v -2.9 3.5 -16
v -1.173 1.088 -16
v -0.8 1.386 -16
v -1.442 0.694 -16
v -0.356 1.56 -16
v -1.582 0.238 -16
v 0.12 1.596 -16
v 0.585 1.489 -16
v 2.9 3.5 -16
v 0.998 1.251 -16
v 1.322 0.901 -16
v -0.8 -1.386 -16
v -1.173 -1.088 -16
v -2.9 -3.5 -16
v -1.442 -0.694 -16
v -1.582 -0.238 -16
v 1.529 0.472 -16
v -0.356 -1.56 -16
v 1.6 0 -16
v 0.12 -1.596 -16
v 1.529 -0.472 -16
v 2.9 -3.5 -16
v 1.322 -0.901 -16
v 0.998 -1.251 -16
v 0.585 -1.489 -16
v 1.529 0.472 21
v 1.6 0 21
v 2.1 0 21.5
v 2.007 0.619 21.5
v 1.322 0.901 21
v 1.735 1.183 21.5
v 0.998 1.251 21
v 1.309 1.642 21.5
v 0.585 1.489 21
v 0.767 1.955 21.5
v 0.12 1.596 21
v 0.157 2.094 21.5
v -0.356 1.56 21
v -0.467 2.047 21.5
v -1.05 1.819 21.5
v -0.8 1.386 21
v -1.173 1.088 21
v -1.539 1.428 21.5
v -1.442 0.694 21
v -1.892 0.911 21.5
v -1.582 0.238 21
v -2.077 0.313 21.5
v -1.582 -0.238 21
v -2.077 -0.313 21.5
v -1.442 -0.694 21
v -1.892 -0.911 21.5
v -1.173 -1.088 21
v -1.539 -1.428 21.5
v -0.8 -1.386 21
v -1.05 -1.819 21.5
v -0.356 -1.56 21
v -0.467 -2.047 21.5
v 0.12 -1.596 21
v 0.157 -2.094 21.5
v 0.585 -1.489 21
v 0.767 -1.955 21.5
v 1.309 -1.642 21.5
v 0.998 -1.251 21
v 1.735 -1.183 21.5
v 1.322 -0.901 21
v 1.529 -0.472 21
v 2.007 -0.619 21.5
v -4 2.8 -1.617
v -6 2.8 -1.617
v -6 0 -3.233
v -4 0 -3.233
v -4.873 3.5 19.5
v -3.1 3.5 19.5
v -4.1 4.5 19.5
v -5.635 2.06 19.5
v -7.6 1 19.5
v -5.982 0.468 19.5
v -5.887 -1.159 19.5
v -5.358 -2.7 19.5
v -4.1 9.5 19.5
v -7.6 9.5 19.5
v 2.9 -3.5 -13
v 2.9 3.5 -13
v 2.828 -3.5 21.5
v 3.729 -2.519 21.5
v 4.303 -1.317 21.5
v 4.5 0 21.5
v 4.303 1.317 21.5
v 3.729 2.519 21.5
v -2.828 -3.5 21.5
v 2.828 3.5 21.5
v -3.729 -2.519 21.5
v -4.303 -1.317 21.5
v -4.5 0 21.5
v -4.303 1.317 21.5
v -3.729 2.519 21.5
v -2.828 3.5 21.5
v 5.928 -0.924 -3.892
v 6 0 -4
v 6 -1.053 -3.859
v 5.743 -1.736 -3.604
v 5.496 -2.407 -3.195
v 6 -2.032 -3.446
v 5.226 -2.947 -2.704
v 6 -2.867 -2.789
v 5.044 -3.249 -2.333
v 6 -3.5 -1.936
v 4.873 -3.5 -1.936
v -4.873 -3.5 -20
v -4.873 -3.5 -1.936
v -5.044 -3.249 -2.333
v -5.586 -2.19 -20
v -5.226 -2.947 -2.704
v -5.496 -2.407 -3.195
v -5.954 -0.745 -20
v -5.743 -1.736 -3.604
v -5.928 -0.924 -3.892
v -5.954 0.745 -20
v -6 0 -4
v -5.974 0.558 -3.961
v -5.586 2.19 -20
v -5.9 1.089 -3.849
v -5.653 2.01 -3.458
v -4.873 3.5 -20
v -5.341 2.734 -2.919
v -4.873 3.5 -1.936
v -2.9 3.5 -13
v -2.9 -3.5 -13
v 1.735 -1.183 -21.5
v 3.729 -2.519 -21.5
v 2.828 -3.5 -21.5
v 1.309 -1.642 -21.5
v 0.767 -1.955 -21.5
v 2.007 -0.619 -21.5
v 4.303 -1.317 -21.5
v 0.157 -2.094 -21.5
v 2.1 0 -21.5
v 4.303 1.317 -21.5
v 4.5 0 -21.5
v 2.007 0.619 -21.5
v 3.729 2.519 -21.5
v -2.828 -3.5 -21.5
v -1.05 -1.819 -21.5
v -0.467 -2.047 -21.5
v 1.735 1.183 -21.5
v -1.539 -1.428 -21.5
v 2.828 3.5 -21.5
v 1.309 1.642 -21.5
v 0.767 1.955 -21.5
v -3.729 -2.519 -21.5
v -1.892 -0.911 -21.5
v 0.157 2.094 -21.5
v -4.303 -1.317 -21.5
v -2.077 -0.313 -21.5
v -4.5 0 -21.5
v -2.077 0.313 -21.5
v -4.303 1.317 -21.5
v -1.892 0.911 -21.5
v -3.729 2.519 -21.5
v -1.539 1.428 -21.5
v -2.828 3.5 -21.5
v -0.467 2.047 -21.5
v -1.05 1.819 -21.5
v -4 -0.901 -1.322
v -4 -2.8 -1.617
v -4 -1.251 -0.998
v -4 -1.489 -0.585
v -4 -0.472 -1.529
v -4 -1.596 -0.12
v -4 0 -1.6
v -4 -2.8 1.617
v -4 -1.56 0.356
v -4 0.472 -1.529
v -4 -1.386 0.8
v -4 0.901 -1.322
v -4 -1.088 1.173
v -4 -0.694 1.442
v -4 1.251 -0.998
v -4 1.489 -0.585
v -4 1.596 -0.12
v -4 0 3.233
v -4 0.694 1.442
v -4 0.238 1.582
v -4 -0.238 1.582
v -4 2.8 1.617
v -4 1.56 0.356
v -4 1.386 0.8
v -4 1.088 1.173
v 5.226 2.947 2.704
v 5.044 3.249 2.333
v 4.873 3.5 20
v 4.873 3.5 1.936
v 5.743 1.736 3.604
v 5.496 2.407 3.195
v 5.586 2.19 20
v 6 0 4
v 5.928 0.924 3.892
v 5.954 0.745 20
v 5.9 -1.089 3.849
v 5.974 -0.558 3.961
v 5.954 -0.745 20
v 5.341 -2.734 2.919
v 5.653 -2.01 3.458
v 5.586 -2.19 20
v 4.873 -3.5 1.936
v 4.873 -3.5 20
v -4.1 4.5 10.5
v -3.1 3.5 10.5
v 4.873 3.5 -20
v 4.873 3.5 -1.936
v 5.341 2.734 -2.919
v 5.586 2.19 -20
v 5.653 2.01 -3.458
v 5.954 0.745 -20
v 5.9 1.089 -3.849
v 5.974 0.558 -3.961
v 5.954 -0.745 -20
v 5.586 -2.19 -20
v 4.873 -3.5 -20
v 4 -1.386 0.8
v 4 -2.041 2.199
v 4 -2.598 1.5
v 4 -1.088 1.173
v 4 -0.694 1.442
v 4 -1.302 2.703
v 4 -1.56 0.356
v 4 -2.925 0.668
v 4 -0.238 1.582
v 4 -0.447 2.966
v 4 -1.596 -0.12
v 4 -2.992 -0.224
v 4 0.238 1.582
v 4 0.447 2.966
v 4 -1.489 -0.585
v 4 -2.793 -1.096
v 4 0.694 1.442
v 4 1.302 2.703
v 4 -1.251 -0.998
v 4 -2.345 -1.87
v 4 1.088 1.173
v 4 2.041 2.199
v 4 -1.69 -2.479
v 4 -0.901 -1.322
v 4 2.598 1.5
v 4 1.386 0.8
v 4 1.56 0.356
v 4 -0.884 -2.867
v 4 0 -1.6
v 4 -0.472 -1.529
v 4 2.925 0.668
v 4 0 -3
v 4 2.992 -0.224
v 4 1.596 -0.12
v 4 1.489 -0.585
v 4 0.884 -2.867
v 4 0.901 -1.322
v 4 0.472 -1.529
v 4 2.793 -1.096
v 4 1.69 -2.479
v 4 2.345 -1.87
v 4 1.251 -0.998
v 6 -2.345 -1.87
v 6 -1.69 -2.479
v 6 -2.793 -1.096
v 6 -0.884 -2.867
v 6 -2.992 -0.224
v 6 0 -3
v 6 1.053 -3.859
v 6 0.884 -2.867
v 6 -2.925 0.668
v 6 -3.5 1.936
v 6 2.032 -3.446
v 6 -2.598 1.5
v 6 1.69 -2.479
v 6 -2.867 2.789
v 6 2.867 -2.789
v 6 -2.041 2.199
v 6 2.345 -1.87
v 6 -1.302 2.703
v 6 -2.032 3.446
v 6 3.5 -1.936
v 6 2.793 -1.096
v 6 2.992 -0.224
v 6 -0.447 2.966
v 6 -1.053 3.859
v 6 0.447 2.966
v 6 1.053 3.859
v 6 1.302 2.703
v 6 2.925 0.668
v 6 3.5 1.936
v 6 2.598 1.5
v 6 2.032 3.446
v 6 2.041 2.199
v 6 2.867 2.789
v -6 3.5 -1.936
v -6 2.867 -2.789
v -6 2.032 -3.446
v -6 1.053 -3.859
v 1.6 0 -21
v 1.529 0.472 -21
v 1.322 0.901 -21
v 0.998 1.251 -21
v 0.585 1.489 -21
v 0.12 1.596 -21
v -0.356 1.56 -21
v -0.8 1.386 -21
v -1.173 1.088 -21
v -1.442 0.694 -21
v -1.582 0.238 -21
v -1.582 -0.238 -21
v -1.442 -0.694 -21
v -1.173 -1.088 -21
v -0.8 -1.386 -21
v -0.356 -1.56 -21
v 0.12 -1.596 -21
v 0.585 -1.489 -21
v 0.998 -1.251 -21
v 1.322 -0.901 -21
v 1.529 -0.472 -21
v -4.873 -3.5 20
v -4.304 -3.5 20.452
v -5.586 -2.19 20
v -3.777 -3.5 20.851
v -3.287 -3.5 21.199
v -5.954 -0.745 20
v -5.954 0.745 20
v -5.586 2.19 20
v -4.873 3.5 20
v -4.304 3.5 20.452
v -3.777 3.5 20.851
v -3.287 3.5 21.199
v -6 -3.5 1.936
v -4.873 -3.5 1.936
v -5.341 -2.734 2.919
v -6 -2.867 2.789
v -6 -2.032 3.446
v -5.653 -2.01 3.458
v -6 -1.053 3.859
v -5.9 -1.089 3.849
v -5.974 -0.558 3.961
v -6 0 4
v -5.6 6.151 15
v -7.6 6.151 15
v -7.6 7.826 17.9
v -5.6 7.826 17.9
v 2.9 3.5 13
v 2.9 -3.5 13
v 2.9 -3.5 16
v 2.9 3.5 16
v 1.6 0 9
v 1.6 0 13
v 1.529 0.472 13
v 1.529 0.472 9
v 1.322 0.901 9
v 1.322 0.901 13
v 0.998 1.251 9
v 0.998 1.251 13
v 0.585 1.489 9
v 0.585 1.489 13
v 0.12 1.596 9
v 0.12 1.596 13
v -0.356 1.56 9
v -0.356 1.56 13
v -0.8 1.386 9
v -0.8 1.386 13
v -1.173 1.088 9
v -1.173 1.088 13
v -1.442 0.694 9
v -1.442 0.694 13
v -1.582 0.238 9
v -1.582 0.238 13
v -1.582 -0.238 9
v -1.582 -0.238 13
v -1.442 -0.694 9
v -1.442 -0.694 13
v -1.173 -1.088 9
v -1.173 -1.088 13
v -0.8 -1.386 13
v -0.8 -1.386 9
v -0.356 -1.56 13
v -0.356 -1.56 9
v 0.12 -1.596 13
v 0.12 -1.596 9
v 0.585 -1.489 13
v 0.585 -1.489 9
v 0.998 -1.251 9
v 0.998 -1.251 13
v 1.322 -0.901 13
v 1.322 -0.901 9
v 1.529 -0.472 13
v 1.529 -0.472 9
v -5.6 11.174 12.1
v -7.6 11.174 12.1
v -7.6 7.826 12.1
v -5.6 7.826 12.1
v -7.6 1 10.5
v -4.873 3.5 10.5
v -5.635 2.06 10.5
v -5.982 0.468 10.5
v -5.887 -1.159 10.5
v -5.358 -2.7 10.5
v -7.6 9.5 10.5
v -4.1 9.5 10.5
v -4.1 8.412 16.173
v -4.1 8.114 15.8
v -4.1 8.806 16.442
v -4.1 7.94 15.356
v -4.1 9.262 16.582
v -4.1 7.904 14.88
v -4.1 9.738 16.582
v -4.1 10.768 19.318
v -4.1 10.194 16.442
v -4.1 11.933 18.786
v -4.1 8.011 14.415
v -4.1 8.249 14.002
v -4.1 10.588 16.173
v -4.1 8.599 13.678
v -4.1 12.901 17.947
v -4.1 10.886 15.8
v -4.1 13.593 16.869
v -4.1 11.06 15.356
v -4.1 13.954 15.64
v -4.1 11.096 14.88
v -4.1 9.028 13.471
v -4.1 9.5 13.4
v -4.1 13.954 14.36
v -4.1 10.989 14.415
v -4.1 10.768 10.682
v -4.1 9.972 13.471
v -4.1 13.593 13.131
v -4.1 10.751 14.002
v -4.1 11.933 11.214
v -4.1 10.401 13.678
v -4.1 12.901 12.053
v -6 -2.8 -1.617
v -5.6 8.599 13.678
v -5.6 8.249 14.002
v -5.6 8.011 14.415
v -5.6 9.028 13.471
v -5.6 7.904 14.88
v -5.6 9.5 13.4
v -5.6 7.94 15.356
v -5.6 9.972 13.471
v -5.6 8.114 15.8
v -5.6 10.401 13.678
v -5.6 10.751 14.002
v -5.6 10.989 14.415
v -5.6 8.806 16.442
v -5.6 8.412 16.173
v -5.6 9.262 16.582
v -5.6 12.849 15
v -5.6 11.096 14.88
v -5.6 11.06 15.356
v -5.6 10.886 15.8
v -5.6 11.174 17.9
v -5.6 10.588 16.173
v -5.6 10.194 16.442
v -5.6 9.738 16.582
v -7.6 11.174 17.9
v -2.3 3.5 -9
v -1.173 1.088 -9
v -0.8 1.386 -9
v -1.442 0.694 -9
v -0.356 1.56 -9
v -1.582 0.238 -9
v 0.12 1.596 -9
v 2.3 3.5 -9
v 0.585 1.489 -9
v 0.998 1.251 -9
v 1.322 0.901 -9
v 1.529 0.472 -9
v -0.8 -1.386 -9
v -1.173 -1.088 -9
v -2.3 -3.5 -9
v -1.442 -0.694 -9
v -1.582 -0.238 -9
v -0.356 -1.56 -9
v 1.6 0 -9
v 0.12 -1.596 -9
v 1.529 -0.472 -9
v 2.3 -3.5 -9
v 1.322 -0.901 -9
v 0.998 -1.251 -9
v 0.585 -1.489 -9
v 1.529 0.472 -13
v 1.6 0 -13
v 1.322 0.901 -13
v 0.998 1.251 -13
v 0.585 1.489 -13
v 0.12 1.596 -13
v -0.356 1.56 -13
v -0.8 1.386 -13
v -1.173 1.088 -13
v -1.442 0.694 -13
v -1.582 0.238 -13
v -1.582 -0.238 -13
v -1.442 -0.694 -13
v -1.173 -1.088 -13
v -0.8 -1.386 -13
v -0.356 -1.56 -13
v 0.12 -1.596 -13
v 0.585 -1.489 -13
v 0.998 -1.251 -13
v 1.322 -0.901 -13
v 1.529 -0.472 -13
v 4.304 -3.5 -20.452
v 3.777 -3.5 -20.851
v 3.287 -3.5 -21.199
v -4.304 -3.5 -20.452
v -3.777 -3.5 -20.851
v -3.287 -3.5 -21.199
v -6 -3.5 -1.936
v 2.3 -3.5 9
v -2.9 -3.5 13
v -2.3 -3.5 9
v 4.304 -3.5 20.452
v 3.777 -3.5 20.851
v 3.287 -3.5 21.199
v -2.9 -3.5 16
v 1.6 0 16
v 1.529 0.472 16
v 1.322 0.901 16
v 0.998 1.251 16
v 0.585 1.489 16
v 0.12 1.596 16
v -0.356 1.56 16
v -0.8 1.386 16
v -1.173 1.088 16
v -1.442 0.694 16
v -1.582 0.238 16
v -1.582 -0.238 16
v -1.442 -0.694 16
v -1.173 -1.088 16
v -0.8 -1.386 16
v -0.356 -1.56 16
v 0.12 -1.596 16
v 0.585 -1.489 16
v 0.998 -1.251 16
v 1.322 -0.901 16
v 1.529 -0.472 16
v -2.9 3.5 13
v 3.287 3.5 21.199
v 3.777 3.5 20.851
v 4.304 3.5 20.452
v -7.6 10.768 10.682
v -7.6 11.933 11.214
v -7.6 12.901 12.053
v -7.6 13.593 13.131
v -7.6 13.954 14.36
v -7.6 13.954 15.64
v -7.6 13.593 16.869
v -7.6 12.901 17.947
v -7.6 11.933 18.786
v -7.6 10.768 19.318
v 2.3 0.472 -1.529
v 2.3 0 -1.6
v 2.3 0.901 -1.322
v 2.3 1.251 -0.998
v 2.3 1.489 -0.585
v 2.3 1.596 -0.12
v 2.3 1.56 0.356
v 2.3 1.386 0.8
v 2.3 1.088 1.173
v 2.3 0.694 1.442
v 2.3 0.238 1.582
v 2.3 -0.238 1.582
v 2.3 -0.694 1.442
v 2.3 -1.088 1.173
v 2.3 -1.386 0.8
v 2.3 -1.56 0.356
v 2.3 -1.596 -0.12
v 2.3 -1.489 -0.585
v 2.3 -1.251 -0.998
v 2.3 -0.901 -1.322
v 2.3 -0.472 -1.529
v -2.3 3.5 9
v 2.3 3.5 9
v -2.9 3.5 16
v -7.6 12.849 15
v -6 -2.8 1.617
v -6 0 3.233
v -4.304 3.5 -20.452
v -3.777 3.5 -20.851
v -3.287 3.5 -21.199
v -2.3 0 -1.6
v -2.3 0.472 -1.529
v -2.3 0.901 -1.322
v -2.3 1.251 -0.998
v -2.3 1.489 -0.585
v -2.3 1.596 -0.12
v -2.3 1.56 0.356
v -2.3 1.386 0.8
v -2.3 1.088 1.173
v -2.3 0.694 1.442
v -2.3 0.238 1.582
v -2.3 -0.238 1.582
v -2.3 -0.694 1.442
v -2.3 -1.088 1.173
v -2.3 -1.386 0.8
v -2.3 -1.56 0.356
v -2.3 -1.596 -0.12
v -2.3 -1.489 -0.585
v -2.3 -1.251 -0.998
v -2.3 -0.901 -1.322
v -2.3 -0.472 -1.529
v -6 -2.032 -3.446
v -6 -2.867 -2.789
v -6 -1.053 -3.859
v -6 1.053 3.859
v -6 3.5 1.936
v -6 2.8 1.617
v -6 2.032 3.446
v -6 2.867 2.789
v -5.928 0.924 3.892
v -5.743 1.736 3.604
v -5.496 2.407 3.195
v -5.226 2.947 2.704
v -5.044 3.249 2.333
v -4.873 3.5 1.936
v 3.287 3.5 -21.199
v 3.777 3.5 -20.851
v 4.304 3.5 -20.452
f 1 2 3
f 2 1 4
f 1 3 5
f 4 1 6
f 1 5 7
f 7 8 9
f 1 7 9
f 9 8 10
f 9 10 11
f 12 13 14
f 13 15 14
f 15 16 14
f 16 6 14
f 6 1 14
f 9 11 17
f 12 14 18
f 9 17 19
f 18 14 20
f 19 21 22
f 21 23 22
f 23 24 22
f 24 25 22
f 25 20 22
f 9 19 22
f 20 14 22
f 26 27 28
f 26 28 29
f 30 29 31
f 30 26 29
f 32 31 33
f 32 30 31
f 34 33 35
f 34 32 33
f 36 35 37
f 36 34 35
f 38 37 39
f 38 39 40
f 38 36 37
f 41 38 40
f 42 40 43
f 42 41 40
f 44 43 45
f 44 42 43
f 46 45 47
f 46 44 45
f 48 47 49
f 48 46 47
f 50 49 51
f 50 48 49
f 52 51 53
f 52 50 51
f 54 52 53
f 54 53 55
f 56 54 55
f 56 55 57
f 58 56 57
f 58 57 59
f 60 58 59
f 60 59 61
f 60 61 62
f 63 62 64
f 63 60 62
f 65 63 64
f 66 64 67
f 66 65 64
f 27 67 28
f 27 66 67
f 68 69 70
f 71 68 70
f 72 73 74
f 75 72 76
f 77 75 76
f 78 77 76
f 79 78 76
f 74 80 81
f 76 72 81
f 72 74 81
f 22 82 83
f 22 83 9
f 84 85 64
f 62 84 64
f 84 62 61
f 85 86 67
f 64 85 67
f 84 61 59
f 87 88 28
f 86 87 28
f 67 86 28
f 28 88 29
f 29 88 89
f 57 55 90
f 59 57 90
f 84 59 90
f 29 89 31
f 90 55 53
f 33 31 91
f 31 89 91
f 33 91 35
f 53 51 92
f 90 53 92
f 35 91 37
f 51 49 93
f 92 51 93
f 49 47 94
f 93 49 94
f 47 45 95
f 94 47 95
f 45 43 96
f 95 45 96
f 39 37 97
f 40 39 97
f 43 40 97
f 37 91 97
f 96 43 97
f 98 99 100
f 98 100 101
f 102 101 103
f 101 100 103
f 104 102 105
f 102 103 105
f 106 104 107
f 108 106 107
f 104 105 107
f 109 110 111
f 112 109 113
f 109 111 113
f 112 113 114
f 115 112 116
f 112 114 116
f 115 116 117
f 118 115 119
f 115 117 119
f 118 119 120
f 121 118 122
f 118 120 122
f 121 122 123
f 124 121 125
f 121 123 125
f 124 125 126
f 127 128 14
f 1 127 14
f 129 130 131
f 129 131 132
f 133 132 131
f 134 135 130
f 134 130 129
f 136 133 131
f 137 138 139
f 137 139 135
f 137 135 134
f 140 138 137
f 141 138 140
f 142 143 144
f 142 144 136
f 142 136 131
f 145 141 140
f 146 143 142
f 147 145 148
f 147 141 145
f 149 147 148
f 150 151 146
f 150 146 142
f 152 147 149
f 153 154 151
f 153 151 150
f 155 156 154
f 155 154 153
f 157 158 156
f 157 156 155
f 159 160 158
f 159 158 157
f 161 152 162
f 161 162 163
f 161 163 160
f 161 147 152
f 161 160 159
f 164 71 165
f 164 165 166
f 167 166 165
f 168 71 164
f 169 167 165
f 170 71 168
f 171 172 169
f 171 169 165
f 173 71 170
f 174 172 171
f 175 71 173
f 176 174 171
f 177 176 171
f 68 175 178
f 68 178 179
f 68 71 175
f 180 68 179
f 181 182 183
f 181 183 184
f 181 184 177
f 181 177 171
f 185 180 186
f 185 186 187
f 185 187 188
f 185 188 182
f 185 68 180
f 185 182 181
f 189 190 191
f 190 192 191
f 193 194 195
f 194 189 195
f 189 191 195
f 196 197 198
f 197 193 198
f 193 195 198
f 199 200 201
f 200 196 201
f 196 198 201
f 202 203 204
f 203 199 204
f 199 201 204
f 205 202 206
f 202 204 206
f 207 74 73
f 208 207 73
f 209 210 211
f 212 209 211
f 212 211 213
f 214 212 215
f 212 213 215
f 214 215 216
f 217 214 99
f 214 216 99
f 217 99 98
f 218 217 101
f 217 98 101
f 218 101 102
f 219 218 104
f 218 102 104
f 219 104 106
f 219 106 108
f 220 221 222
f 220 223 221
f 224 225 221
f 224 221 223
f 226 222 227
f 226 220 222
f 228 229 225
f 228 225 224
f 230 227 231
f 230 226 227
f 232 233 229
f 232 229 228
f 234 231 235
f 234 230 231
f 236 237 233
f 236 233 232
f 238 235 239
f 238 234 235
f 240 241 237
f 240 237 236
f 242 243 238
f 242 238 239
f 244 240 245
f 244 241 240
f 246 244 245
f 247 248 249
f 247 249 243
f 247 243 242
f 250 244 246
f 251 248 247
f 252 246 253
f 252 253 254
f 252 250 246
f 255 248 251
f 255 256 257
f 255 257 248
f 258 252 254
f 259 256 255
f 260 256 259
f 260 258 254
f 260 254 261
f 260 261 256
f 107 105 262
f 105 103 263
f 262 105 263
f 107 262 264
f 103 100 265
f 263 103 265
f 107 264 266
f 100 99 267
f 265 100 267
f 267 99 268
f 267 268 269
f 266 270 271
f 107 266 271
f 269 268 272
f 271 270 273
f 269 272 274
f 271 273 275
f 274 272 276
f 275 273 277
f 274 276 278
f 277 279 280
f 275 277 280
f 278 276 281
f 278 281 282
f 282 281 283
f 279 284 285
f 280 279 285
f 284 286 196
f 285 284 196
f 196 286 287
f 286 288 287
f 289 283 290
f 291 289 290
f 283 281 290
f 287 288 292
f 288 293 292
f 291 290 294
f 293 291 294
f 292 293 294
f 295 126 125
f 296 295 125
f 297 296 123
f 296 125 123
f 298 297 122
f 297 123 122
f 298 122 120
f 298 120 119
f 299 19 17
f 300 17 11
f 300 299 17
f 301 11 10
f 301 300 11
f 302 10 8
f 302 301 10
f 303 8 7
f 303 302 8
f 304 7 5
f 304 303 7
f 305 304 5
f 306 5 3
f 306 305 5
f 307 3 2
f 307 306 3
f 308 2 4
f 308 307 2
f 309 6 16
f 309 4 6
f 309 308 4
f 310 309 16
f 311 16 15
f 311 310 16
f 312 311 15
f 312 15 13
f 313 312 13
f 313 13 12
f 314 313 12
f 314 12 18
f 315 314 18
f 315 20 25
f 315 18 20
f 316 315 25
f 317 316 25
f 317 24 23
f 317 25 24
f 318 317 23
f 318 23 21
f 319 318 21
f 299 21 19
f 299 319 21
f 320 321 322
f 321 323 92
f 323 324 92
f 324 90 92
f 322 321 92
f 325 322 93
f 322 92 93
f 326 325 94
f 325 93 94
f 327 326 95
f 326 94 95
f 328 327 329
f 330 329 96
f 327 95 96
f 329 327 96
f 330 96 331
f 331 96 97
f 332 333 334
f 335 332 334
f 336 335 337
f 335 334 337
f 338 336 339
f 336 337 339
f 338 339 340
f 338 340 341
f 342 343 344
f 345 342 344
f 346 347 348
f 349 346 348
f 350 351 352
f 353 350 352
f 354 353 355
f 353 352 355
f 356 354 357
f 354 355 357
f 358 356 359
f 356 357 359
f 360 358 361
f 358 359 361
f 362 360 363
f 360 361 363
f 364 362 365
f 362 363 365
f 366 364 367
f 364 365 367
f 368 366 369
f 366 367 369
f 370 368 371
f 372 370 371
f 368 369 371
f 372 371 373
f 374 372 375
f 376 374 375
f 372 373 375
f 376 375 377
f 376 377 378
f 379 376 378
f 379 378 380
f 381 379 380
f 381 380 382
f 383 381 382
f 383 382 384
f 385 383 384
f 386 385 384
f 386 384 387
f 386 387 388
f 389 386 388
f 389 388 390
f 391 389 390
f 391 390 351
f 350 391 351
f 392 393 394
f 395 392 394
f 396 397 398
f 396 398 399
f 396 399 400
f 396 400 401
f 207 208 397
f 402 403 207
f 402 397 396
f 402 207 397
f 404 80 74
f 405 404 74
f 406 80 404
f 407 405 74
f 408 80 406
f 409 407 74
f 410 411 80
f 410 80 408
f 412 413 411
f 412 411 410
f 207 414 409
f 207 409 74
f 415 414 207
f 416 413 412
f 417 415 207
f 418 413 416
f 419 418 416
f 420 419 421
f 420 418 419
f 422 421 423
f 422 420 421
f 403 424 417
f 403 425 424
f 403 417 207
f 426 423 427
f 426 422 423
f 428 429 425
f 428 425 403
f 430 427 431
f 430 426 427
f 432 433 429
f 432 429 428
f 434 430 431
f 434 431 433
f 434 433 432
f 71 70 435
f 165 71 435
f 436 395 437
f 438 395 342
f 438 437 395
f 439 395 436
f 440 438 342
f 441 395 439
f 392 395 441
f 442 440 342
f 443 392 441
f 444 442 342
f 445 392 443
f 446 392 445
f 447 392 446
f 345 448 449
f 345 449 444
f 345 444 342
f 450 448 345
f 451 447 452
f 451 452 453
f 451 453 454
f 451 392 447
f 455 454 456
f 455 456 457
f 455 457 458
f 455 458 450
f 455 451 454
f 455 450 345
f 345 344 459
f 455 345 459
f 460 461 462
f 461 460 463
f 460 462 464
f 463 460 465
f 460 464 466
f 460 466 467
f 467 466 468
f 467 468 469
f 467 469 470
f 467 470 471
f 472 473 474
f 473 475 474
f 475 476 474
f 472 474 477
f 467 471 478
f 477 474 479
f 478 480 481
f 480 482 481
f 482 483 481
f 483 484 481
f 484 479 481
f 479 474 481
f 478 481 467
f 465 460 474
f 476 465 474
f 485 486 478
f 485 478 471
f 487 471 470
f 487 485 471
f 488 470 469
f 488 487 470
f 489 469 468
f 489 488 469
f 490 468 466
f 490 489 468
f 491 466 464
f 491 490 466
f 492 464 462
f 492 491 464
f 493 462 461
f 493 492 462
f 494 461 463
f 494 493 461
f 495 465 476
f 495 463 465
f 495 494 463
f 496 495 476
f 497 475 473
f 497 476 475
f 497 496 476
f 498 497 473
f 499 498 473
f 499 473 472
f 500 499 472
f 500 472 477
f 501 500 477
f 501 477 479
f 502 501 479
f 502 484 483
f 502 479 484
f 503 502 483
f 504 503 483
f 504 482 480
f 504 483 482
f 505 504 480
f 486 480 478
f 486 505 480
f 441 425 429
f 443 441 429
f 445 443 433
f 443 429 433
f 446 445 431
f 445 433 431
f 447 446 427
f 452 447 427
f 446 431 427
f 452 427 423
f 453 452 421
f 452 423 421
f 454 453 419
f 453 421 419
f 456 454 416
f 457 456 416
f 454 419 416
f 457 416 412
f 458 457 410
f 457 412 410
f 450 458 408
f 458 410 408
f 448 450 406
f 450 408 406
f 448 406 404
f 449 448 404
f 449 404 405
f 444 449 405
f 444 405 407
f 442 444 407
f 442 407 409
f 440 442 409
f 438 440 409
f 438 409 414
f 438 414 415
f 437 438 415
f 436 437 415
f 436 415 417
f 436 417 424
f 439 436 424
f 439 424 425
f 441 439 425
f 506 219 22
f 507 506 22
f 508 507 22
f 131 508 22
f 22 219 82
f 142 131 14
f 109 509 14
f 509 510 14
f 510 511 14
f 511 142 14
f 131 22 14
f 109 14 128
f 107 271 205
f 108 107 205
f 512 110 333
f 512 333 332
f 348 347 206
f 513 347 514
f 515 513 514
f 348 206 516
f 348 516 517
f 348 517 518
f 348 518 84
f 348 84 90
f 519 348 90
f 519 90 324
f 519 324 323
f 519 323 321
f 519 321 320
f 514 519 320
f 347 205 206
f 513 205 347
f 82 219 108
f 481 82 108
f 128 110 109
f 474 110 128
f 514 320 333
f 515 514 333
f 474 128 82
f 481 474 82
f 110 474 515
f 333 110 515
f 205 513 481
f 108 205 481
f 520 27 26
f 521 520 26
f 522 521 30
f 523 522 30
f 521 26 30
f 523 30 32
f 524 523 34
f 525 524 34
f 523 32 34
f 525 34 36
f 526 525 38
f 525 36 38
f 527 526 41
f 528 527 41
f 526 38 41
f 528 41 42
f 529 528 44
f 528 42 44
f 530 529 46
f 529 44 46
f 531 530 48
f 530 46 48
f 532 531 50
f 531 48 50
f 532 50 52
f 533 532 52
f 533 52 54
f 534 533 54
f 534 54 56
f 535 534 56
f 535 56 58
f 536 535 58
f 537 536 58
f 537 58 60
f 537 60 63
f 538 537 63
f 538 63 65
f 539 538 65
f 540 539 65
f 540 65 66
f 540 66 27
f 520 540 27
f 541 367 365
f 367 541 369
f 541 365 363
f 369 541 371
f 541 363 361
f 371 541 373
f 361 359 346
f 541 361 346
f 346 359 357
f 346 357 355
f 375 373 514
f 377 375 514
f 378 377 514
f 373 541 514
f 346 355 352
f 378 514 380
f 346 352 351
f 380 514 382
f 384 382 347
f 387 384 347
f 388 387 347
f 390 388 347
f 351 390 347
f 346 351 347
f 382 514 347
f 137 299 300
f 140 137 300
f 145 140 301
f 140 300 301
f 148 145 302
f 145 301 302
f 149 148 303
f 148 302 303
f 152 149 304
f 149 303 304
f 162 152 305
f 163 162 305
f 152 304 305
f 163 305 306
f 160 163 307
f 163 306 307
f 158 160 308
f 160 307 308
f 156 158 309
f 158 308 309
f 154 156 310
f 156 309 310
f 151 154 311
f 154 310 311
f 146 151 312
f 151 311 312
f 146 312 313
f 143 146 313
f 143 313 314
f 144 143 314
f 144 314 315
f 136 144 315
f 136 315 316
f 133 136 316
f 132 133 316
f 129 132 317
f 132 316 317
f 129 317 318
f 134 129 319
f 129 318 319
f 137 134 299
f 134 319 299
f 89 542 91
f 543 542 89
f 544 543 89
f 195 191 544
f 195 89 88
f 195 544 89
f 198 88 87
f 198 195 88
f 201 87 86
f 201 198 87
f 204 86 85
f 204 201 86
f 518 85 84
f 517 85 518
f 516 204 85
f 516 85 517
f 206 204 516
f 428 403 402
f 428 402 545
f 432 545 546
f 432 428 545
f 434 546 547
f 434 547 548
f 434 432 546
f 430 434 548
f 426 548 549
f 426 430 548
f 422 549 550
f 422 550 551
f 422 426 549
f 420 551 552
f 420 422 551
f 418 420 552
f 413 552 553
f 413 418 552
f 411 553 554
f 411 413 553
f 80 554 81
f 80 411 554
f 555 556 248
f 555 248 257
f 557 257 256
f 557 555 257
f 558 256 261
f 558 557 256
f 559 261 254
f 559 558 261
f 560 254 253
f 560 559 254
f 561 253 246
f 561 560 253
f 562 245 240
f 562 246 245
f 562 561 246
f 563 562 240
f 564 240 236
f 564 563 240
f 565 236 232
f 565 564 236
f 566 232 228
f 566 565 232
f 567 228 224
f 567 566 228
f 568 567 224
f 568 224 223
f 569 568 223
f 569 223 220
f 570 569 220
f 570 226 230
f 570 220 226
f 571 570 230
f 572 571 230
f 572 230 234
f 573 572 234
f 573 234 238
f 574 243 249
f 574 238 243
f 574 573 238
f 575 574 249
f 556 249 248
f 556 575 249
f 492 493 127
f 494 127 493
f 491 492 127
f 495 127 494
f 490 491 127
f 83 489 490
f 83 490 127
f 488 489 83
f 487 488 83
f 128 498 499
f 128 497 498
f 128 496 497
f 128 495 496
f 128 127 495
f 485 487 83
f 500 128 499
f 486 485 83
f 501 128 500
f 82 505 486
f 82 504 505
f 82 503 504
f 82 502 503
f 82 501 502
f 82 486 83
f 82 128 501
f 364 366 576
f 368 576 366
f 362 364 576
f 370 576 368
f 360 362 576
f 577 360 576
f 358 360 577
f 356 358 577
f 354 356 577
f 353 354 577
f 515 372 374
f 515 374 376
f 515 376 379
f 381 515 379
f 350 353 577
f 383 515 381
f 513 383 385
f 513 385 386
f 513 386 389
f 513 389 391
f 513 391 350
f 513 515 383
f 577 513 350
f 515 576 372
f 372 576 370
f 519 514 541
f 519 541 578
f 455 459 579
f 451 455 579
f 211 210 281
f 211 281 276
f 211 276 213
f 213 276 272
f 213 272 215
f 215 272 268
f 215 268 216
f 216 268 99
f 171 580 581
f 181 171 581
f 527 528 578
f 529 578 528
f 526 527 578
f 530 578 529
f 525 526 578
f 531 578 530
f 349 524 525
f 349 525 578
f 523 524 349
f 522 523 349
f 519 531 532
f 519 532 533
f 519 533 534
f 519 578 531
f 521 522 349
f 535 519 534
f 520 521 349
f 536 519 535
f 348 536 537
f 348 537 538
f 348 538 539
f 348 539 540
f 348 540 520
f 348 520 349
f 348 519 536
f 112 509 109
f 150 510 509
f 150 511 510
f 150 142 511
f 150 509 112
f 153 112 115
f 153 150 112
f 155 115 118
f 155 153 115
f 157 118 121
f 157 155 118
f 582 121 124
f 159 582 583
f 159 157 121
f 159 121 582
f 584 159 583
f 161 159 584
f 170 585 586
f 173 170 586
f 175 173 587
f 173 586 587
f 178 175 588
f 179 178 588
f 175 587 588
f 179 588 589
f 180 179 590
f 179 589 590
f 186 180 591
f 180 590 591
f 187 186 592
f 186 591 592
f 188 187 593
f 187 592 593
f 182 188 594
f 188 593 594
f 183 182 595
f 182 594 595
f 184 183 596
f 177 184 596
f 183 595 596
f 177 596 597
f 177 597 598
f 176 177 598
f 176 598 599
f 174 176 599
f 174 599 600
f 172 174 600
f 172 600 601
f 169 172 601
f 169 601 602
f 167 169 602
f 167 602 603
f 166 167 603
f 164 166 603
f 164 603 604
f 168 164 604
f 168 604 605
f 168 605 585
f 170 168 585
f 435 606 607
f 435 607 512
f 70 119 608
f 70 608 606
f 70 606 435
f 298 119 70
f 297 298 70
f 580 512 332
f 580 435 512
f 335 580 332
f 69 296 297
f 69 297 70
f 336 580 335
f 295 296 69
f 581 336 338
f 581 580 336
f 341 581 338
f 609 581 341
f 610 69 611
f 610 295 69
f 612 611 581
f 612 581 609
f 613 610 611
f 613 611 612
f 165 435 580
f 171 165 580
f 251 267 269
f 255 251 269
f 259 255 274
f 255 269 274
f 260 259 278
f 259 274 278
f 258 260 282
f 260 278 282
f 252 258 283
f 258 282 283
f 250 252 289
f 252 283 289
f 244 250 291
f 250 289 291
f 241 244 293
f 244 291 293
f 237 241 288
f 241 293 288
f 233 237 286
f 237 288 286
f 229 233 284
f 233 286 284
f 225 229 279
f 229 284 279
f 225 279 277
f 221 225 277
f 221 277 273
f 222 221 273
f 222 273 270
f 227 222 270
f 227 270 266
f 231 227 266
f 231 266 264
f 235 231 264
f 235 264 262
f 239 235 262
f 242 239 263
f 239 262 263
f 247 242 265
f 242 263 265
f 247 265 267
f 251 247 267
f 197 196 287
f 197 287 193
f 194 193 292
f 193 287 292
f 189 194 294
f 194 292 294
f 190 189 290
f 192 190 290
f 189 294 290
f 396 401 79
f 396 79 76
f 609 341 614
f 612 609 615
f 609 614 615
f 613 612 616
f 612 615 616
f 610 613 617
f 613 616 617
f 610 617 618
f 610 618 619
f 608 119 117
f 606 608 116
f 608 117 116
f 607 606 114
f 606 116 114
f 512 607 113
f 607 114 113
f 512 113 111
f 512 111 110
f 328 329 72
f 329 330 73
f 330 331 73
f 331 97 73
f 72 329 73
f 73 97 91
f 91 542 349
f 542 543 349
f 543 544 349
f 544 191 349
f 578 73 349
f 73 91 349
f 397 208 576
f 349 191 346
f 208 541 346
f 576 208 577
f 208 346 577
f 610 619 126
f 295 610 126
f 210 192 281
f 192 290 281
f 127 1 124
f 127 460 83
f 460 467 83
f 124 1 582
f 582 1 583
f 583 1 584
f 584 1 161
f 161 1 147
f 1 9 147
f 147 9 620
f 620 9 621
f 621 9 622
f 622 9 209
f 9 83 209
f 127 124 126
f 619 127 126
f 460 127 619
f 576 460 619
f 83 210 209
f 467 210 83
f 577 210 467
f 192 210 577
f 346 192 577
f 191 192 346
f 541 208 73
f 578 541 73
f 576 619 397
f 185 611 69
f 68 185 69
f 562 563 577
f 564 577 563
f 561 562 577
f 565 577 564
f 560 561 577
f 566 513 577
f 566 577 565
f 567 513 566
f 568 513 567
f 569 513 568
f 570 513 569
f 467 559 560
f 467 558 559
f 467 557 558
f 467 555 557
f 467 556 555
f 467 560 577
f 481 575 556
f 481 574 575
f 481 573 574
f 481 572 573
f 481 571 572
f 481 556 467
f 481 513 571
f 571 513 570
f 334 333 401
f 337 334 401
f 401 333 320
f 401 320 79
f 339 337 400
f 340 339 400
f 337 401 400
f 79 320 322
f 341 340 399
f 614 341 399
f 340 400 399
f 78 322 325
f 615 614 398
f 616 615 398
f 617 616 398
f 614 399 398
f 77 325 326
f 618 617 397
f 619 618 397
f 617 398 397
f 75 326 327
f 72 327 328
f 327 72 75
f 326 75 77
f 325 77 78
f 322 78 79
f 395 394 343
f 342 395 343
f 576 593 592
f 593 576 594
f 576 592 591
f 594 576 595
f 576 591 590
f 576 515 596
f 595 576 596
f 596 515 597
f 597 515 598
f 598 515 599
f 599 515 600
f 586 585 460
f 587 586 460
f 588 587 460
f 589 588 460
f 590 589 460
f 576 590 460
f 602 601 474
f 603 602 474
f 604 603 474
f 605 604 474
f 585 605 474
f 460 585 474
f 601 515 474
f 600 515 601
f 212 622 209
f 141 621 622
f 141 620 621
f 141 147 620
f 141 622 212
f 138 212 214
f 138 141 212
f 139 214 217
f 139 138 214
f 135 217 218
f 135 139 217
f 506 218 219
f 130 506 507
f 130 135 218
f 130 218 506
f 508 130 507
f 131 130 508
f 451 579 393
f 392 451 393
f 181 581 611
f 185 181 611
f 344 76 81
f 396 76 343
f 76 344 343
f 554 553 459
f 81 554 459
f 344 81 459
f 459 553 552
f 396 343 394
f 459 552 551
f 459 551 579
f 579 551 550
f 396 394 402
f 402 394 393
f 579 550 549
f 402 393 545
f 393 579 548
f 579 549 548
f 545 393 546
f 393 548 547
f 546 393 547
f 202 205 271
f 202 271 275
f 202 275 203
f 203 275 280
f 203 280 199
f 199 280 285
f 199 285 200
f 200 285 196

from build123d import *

# Parameters (mm, degrees)
BOSS_EXTRUDE1_DEPTH     = 21.5
BOSS_EXTRUDE2_DEPTH     = 6
CHAMFER1_SIZE           = 1.5
SKETCH2_W               = 4.6
SKETCH2_H               = 18
CUT_EXTRUDE1_DEPTH      = 4.5000001
CUT_EXTRUDE1_DEPTH_BACK = 4.5000001
SKETCH3_R               = 1.6
CUT_EXTRUDE2_DEPTH      = 16
CHAMFER2_SIZE           = 0.5
SKETCH4_R               = 1.6
CUT_EXTRUDE3_DEPTH      = 7.0000001
CUT_EXTRUDE3_DEPTH_BACK = 7.0000001
SKETCH6_R               = 3
CUT_EXTRUDE4_DEPTH      = 2
CUT_EXTRUDE5_DEPTH      = 2
BOSS_EXTRUDE3_START     = -4.1
SKETCH8_R               = 1.6
BOSS_EXTRUDE3_DEPTH     = 3.5
BOSS_EXTRUDE4_DEPTH     = 9
BOSS_EXTRUDE5_DEPTH     = 9
CUT_EXTRUDE6_DEPTH      = 2
SKETCH13_W              = 5.8
SKETCH13_H              = 3
CUT_EXTRUDE8_DEPTH      = 18.5


with BuildPart() as part:
    # Sketch1 → Boss-Extrude1 (new body, symmetric)
    with BuildSketch(Plane.XY):
        with BuildLine():
            Line((-4.873397172, 3.5), (4.873397172, 3.5))
            ThreePointArc((4.873397172, 3.5), (6, 0), (4.873397172, -3.5))
            Line((4.873397172, -3.5), (-4.873397172, -3.5))
            ThreePointArc((-4.873397172, -3.5), (-6, 0), (-4.873397172, 3.5))
        make_face()
    extrude(amount=BOSS_EXTRUDE1_DEPTH, both=True)

    # Sketch5 → Boss-Extrude2 (add, symmetric)
    with BuildSketch(Plane(origin=(0, 0, 0), x_dir=(0, 0, -1), z_dir=(1, 0, 0))):
        with BuildLine():
            Line((-1.936491673, 3.5), (1.936491673, 3.5))
            ThreePointArc((1.936491673, 3.5), (4, 0), (1.936491673, -3.5))
            Line((1.936491673, -3.5), (-1.936491673, -3.5))
            ThreePointArc((-1.936491673, -3.5), (-4, 0), (-1.936491673, 3.5))
        make_face()
    extrude(amount=BOSS_EXTRUDE2_DEPTH, both=True)

    # Chamfer1
    chamfer1_edges = [part.edges().sort_by_distance(p)[0] for p in [
        (-6, 0, 21.5),
        (6, 0, 21.5),
        (-6, 0, -21.5),
        (6, 0, -21.5),
    ]]
    chamfer(chamfer1_edges, length=CHAMFER1_SIZE)

    # Sketch2 → Cut-Extrude1 (cut, two sides)
    with BuildSketch(Plane(origin=(0, 0, 0), x_dir=(1, 0, 0), z_dir=(0, 1, 0))) as cut_extrude1_sk:
        Rectangle(SKETCH2_W, SKETCH2_H)
    extrude(amount=CUT_EXTRUDE1_DEPTH, mode=Mode.SUBTRACT)
    extrude(cut_extrude1_sk.sketch, amount=-CUT_EXTRUDE1_DEPTH_BACK, mode=Mode.SUBTRACT)

    # Sketch3 → Cut-Extrude2 (cut)
    with BuildSketch(Plane.XY.offset(21.5)):
        Circle(SKETCH3_R)
    cut_extrude2 = extrude(amount=-CUT_EXTRUDE2_DEPTH, mode=Mode.SUBTRACT)

    # Mirror2: Cut-Extrude2 across plane
    add(cut_extrude2.mirror(Plane.XY), mode=Mode.SUBTRACT)

    # Chamfer2
    chamfer2_edges = [part.edges().sort_by_distance(p)[0] for p in [
        (-1.6, 0, 21.5),
        (-1.6, 0, -21.5),
    ]]
    chamfer(chamfer2_edges, length=CHAMFER2_SIZE)

    # Sketch4 → Cut-Extrude3 (cut, two sides)
    with BuildSketch(Plane(origin=(0, 0, 0), x_dir=(0, 0, -1), z_dir=(1, 0, 0))) as cut_extrude3_sk:
        Circle(SKETCH4_R)
    extrude(amount=CUT_EXTRUDE3_DEPTH, mode=Mode.SUBTRACT)
    extrude(cut_extrude3_sk.sketch, amount=-CUT_EXTRUDE3_DEPTH_BACK, mode=Mode.SUBTRACT)

    # Sketch6 → Cut-Extrude4 (cut)
    with BuildSketch(Plane(origin=(6, 0, 0), x_dir=(0, 0, -1), z_dir=(1, 0, 0))):
        Circle(SKETCH6_R)
    extrude(amount=-CUT_EXTRUDE4_DEPTH, mode=Mode.SUBTRACT)

    # Sketch7 → Cut-Extrude5 (cut)
    with BuildSketch(Plane.ZY.offset(6)):
        Polygon((3.233161507, 0), (1.616580754, 2.8), (-1.616580754, 2.8), (-3.233161507, 0), (-1.616580754, -2.8), (1.616580754, -2.8), align=None)
    extrude(amount=-CUT_EXTRUDE5_DEPTH, mode=Mode.SUBTRACT)

    # Sketch8 → Boss-Extrude3 (add)
    with BuildSketch(Plane(origin=(0, 0, 0), x_dir=(0, 0, -1), z_dir=(1, 0, 0)).offset(BOSS_EXTRUDE3_START)):
        with BuildLine():
            Line((-19.5, 9.5), (-19.5, 1))
            Line((-19.5, 1), (-10.5, 1))
            Line((-10.5, 1), (-10.5, 9.5))
            ThreePointArc((-10.5, 9.5), (-15, 14), (-19.5, 9.5))
        make_face()
        with Locations((-15, 9.5)):
            Circle(SKETCH8_R, mode=Mode.SUBTRACT)
    extrude(amount=-BOSS_EXTRUDE3_DEPTH)

    # Sketch9 → Boss-Extrude4 (add)
    with BuildSketch(Plane.XY.offset(19.5)):
        Polygon((-7.6, 1), (-4.1, 1), (-4.873397172, -3.5), align=None)
    extrude(amount=-BOSS_EXTRUDE4_DEPTH)

    # Sketch10 → Boss-Extrude5 (add)
    with BuildSketch(Plane.XY.offset(19.5)):
        Polygon((-4.1, 4.5), (-3.1, 3.5), (-4.1, 3.5), align=None)
    extrude(amount=-BOSS_EXTRUDE5_DEPTH)

    # Sketch11 → Cut-Extrude6 (cut)
    with BuildSketch(Plane.ZY.offset(7.6)):
        Polygon((15, 6.151368439), (17.9, 7.825684219), (17.9, 11.174315781), (15, 12.848631561), (12.1, 11.174315781), (12.1, 7.825684219), align=None)
    extrude(amount=-CUT_EXTRUDE6_DEPTH, mode=Mode.SUBTRACT)

    # Sketch13 → Cut-Extrude8 (cut, through all)
    with BuildSketch(Plane.XZ.offset(3.5)):
        with Locations((0, 14.5)):
            Rectangle(SKETCH13_W, SKETCH13_H)
    cut_extrude8 = extrude(amount=-CUT_EXTRUDE8_DEPTH, mode=Mode.SUBTRACT)

    # Mirror4: Cut-Extrude8 across plane
    add(cut_extrude8.mirror(Plane.XY), mode=Mode.SUBTRACT)


solid = part.part
